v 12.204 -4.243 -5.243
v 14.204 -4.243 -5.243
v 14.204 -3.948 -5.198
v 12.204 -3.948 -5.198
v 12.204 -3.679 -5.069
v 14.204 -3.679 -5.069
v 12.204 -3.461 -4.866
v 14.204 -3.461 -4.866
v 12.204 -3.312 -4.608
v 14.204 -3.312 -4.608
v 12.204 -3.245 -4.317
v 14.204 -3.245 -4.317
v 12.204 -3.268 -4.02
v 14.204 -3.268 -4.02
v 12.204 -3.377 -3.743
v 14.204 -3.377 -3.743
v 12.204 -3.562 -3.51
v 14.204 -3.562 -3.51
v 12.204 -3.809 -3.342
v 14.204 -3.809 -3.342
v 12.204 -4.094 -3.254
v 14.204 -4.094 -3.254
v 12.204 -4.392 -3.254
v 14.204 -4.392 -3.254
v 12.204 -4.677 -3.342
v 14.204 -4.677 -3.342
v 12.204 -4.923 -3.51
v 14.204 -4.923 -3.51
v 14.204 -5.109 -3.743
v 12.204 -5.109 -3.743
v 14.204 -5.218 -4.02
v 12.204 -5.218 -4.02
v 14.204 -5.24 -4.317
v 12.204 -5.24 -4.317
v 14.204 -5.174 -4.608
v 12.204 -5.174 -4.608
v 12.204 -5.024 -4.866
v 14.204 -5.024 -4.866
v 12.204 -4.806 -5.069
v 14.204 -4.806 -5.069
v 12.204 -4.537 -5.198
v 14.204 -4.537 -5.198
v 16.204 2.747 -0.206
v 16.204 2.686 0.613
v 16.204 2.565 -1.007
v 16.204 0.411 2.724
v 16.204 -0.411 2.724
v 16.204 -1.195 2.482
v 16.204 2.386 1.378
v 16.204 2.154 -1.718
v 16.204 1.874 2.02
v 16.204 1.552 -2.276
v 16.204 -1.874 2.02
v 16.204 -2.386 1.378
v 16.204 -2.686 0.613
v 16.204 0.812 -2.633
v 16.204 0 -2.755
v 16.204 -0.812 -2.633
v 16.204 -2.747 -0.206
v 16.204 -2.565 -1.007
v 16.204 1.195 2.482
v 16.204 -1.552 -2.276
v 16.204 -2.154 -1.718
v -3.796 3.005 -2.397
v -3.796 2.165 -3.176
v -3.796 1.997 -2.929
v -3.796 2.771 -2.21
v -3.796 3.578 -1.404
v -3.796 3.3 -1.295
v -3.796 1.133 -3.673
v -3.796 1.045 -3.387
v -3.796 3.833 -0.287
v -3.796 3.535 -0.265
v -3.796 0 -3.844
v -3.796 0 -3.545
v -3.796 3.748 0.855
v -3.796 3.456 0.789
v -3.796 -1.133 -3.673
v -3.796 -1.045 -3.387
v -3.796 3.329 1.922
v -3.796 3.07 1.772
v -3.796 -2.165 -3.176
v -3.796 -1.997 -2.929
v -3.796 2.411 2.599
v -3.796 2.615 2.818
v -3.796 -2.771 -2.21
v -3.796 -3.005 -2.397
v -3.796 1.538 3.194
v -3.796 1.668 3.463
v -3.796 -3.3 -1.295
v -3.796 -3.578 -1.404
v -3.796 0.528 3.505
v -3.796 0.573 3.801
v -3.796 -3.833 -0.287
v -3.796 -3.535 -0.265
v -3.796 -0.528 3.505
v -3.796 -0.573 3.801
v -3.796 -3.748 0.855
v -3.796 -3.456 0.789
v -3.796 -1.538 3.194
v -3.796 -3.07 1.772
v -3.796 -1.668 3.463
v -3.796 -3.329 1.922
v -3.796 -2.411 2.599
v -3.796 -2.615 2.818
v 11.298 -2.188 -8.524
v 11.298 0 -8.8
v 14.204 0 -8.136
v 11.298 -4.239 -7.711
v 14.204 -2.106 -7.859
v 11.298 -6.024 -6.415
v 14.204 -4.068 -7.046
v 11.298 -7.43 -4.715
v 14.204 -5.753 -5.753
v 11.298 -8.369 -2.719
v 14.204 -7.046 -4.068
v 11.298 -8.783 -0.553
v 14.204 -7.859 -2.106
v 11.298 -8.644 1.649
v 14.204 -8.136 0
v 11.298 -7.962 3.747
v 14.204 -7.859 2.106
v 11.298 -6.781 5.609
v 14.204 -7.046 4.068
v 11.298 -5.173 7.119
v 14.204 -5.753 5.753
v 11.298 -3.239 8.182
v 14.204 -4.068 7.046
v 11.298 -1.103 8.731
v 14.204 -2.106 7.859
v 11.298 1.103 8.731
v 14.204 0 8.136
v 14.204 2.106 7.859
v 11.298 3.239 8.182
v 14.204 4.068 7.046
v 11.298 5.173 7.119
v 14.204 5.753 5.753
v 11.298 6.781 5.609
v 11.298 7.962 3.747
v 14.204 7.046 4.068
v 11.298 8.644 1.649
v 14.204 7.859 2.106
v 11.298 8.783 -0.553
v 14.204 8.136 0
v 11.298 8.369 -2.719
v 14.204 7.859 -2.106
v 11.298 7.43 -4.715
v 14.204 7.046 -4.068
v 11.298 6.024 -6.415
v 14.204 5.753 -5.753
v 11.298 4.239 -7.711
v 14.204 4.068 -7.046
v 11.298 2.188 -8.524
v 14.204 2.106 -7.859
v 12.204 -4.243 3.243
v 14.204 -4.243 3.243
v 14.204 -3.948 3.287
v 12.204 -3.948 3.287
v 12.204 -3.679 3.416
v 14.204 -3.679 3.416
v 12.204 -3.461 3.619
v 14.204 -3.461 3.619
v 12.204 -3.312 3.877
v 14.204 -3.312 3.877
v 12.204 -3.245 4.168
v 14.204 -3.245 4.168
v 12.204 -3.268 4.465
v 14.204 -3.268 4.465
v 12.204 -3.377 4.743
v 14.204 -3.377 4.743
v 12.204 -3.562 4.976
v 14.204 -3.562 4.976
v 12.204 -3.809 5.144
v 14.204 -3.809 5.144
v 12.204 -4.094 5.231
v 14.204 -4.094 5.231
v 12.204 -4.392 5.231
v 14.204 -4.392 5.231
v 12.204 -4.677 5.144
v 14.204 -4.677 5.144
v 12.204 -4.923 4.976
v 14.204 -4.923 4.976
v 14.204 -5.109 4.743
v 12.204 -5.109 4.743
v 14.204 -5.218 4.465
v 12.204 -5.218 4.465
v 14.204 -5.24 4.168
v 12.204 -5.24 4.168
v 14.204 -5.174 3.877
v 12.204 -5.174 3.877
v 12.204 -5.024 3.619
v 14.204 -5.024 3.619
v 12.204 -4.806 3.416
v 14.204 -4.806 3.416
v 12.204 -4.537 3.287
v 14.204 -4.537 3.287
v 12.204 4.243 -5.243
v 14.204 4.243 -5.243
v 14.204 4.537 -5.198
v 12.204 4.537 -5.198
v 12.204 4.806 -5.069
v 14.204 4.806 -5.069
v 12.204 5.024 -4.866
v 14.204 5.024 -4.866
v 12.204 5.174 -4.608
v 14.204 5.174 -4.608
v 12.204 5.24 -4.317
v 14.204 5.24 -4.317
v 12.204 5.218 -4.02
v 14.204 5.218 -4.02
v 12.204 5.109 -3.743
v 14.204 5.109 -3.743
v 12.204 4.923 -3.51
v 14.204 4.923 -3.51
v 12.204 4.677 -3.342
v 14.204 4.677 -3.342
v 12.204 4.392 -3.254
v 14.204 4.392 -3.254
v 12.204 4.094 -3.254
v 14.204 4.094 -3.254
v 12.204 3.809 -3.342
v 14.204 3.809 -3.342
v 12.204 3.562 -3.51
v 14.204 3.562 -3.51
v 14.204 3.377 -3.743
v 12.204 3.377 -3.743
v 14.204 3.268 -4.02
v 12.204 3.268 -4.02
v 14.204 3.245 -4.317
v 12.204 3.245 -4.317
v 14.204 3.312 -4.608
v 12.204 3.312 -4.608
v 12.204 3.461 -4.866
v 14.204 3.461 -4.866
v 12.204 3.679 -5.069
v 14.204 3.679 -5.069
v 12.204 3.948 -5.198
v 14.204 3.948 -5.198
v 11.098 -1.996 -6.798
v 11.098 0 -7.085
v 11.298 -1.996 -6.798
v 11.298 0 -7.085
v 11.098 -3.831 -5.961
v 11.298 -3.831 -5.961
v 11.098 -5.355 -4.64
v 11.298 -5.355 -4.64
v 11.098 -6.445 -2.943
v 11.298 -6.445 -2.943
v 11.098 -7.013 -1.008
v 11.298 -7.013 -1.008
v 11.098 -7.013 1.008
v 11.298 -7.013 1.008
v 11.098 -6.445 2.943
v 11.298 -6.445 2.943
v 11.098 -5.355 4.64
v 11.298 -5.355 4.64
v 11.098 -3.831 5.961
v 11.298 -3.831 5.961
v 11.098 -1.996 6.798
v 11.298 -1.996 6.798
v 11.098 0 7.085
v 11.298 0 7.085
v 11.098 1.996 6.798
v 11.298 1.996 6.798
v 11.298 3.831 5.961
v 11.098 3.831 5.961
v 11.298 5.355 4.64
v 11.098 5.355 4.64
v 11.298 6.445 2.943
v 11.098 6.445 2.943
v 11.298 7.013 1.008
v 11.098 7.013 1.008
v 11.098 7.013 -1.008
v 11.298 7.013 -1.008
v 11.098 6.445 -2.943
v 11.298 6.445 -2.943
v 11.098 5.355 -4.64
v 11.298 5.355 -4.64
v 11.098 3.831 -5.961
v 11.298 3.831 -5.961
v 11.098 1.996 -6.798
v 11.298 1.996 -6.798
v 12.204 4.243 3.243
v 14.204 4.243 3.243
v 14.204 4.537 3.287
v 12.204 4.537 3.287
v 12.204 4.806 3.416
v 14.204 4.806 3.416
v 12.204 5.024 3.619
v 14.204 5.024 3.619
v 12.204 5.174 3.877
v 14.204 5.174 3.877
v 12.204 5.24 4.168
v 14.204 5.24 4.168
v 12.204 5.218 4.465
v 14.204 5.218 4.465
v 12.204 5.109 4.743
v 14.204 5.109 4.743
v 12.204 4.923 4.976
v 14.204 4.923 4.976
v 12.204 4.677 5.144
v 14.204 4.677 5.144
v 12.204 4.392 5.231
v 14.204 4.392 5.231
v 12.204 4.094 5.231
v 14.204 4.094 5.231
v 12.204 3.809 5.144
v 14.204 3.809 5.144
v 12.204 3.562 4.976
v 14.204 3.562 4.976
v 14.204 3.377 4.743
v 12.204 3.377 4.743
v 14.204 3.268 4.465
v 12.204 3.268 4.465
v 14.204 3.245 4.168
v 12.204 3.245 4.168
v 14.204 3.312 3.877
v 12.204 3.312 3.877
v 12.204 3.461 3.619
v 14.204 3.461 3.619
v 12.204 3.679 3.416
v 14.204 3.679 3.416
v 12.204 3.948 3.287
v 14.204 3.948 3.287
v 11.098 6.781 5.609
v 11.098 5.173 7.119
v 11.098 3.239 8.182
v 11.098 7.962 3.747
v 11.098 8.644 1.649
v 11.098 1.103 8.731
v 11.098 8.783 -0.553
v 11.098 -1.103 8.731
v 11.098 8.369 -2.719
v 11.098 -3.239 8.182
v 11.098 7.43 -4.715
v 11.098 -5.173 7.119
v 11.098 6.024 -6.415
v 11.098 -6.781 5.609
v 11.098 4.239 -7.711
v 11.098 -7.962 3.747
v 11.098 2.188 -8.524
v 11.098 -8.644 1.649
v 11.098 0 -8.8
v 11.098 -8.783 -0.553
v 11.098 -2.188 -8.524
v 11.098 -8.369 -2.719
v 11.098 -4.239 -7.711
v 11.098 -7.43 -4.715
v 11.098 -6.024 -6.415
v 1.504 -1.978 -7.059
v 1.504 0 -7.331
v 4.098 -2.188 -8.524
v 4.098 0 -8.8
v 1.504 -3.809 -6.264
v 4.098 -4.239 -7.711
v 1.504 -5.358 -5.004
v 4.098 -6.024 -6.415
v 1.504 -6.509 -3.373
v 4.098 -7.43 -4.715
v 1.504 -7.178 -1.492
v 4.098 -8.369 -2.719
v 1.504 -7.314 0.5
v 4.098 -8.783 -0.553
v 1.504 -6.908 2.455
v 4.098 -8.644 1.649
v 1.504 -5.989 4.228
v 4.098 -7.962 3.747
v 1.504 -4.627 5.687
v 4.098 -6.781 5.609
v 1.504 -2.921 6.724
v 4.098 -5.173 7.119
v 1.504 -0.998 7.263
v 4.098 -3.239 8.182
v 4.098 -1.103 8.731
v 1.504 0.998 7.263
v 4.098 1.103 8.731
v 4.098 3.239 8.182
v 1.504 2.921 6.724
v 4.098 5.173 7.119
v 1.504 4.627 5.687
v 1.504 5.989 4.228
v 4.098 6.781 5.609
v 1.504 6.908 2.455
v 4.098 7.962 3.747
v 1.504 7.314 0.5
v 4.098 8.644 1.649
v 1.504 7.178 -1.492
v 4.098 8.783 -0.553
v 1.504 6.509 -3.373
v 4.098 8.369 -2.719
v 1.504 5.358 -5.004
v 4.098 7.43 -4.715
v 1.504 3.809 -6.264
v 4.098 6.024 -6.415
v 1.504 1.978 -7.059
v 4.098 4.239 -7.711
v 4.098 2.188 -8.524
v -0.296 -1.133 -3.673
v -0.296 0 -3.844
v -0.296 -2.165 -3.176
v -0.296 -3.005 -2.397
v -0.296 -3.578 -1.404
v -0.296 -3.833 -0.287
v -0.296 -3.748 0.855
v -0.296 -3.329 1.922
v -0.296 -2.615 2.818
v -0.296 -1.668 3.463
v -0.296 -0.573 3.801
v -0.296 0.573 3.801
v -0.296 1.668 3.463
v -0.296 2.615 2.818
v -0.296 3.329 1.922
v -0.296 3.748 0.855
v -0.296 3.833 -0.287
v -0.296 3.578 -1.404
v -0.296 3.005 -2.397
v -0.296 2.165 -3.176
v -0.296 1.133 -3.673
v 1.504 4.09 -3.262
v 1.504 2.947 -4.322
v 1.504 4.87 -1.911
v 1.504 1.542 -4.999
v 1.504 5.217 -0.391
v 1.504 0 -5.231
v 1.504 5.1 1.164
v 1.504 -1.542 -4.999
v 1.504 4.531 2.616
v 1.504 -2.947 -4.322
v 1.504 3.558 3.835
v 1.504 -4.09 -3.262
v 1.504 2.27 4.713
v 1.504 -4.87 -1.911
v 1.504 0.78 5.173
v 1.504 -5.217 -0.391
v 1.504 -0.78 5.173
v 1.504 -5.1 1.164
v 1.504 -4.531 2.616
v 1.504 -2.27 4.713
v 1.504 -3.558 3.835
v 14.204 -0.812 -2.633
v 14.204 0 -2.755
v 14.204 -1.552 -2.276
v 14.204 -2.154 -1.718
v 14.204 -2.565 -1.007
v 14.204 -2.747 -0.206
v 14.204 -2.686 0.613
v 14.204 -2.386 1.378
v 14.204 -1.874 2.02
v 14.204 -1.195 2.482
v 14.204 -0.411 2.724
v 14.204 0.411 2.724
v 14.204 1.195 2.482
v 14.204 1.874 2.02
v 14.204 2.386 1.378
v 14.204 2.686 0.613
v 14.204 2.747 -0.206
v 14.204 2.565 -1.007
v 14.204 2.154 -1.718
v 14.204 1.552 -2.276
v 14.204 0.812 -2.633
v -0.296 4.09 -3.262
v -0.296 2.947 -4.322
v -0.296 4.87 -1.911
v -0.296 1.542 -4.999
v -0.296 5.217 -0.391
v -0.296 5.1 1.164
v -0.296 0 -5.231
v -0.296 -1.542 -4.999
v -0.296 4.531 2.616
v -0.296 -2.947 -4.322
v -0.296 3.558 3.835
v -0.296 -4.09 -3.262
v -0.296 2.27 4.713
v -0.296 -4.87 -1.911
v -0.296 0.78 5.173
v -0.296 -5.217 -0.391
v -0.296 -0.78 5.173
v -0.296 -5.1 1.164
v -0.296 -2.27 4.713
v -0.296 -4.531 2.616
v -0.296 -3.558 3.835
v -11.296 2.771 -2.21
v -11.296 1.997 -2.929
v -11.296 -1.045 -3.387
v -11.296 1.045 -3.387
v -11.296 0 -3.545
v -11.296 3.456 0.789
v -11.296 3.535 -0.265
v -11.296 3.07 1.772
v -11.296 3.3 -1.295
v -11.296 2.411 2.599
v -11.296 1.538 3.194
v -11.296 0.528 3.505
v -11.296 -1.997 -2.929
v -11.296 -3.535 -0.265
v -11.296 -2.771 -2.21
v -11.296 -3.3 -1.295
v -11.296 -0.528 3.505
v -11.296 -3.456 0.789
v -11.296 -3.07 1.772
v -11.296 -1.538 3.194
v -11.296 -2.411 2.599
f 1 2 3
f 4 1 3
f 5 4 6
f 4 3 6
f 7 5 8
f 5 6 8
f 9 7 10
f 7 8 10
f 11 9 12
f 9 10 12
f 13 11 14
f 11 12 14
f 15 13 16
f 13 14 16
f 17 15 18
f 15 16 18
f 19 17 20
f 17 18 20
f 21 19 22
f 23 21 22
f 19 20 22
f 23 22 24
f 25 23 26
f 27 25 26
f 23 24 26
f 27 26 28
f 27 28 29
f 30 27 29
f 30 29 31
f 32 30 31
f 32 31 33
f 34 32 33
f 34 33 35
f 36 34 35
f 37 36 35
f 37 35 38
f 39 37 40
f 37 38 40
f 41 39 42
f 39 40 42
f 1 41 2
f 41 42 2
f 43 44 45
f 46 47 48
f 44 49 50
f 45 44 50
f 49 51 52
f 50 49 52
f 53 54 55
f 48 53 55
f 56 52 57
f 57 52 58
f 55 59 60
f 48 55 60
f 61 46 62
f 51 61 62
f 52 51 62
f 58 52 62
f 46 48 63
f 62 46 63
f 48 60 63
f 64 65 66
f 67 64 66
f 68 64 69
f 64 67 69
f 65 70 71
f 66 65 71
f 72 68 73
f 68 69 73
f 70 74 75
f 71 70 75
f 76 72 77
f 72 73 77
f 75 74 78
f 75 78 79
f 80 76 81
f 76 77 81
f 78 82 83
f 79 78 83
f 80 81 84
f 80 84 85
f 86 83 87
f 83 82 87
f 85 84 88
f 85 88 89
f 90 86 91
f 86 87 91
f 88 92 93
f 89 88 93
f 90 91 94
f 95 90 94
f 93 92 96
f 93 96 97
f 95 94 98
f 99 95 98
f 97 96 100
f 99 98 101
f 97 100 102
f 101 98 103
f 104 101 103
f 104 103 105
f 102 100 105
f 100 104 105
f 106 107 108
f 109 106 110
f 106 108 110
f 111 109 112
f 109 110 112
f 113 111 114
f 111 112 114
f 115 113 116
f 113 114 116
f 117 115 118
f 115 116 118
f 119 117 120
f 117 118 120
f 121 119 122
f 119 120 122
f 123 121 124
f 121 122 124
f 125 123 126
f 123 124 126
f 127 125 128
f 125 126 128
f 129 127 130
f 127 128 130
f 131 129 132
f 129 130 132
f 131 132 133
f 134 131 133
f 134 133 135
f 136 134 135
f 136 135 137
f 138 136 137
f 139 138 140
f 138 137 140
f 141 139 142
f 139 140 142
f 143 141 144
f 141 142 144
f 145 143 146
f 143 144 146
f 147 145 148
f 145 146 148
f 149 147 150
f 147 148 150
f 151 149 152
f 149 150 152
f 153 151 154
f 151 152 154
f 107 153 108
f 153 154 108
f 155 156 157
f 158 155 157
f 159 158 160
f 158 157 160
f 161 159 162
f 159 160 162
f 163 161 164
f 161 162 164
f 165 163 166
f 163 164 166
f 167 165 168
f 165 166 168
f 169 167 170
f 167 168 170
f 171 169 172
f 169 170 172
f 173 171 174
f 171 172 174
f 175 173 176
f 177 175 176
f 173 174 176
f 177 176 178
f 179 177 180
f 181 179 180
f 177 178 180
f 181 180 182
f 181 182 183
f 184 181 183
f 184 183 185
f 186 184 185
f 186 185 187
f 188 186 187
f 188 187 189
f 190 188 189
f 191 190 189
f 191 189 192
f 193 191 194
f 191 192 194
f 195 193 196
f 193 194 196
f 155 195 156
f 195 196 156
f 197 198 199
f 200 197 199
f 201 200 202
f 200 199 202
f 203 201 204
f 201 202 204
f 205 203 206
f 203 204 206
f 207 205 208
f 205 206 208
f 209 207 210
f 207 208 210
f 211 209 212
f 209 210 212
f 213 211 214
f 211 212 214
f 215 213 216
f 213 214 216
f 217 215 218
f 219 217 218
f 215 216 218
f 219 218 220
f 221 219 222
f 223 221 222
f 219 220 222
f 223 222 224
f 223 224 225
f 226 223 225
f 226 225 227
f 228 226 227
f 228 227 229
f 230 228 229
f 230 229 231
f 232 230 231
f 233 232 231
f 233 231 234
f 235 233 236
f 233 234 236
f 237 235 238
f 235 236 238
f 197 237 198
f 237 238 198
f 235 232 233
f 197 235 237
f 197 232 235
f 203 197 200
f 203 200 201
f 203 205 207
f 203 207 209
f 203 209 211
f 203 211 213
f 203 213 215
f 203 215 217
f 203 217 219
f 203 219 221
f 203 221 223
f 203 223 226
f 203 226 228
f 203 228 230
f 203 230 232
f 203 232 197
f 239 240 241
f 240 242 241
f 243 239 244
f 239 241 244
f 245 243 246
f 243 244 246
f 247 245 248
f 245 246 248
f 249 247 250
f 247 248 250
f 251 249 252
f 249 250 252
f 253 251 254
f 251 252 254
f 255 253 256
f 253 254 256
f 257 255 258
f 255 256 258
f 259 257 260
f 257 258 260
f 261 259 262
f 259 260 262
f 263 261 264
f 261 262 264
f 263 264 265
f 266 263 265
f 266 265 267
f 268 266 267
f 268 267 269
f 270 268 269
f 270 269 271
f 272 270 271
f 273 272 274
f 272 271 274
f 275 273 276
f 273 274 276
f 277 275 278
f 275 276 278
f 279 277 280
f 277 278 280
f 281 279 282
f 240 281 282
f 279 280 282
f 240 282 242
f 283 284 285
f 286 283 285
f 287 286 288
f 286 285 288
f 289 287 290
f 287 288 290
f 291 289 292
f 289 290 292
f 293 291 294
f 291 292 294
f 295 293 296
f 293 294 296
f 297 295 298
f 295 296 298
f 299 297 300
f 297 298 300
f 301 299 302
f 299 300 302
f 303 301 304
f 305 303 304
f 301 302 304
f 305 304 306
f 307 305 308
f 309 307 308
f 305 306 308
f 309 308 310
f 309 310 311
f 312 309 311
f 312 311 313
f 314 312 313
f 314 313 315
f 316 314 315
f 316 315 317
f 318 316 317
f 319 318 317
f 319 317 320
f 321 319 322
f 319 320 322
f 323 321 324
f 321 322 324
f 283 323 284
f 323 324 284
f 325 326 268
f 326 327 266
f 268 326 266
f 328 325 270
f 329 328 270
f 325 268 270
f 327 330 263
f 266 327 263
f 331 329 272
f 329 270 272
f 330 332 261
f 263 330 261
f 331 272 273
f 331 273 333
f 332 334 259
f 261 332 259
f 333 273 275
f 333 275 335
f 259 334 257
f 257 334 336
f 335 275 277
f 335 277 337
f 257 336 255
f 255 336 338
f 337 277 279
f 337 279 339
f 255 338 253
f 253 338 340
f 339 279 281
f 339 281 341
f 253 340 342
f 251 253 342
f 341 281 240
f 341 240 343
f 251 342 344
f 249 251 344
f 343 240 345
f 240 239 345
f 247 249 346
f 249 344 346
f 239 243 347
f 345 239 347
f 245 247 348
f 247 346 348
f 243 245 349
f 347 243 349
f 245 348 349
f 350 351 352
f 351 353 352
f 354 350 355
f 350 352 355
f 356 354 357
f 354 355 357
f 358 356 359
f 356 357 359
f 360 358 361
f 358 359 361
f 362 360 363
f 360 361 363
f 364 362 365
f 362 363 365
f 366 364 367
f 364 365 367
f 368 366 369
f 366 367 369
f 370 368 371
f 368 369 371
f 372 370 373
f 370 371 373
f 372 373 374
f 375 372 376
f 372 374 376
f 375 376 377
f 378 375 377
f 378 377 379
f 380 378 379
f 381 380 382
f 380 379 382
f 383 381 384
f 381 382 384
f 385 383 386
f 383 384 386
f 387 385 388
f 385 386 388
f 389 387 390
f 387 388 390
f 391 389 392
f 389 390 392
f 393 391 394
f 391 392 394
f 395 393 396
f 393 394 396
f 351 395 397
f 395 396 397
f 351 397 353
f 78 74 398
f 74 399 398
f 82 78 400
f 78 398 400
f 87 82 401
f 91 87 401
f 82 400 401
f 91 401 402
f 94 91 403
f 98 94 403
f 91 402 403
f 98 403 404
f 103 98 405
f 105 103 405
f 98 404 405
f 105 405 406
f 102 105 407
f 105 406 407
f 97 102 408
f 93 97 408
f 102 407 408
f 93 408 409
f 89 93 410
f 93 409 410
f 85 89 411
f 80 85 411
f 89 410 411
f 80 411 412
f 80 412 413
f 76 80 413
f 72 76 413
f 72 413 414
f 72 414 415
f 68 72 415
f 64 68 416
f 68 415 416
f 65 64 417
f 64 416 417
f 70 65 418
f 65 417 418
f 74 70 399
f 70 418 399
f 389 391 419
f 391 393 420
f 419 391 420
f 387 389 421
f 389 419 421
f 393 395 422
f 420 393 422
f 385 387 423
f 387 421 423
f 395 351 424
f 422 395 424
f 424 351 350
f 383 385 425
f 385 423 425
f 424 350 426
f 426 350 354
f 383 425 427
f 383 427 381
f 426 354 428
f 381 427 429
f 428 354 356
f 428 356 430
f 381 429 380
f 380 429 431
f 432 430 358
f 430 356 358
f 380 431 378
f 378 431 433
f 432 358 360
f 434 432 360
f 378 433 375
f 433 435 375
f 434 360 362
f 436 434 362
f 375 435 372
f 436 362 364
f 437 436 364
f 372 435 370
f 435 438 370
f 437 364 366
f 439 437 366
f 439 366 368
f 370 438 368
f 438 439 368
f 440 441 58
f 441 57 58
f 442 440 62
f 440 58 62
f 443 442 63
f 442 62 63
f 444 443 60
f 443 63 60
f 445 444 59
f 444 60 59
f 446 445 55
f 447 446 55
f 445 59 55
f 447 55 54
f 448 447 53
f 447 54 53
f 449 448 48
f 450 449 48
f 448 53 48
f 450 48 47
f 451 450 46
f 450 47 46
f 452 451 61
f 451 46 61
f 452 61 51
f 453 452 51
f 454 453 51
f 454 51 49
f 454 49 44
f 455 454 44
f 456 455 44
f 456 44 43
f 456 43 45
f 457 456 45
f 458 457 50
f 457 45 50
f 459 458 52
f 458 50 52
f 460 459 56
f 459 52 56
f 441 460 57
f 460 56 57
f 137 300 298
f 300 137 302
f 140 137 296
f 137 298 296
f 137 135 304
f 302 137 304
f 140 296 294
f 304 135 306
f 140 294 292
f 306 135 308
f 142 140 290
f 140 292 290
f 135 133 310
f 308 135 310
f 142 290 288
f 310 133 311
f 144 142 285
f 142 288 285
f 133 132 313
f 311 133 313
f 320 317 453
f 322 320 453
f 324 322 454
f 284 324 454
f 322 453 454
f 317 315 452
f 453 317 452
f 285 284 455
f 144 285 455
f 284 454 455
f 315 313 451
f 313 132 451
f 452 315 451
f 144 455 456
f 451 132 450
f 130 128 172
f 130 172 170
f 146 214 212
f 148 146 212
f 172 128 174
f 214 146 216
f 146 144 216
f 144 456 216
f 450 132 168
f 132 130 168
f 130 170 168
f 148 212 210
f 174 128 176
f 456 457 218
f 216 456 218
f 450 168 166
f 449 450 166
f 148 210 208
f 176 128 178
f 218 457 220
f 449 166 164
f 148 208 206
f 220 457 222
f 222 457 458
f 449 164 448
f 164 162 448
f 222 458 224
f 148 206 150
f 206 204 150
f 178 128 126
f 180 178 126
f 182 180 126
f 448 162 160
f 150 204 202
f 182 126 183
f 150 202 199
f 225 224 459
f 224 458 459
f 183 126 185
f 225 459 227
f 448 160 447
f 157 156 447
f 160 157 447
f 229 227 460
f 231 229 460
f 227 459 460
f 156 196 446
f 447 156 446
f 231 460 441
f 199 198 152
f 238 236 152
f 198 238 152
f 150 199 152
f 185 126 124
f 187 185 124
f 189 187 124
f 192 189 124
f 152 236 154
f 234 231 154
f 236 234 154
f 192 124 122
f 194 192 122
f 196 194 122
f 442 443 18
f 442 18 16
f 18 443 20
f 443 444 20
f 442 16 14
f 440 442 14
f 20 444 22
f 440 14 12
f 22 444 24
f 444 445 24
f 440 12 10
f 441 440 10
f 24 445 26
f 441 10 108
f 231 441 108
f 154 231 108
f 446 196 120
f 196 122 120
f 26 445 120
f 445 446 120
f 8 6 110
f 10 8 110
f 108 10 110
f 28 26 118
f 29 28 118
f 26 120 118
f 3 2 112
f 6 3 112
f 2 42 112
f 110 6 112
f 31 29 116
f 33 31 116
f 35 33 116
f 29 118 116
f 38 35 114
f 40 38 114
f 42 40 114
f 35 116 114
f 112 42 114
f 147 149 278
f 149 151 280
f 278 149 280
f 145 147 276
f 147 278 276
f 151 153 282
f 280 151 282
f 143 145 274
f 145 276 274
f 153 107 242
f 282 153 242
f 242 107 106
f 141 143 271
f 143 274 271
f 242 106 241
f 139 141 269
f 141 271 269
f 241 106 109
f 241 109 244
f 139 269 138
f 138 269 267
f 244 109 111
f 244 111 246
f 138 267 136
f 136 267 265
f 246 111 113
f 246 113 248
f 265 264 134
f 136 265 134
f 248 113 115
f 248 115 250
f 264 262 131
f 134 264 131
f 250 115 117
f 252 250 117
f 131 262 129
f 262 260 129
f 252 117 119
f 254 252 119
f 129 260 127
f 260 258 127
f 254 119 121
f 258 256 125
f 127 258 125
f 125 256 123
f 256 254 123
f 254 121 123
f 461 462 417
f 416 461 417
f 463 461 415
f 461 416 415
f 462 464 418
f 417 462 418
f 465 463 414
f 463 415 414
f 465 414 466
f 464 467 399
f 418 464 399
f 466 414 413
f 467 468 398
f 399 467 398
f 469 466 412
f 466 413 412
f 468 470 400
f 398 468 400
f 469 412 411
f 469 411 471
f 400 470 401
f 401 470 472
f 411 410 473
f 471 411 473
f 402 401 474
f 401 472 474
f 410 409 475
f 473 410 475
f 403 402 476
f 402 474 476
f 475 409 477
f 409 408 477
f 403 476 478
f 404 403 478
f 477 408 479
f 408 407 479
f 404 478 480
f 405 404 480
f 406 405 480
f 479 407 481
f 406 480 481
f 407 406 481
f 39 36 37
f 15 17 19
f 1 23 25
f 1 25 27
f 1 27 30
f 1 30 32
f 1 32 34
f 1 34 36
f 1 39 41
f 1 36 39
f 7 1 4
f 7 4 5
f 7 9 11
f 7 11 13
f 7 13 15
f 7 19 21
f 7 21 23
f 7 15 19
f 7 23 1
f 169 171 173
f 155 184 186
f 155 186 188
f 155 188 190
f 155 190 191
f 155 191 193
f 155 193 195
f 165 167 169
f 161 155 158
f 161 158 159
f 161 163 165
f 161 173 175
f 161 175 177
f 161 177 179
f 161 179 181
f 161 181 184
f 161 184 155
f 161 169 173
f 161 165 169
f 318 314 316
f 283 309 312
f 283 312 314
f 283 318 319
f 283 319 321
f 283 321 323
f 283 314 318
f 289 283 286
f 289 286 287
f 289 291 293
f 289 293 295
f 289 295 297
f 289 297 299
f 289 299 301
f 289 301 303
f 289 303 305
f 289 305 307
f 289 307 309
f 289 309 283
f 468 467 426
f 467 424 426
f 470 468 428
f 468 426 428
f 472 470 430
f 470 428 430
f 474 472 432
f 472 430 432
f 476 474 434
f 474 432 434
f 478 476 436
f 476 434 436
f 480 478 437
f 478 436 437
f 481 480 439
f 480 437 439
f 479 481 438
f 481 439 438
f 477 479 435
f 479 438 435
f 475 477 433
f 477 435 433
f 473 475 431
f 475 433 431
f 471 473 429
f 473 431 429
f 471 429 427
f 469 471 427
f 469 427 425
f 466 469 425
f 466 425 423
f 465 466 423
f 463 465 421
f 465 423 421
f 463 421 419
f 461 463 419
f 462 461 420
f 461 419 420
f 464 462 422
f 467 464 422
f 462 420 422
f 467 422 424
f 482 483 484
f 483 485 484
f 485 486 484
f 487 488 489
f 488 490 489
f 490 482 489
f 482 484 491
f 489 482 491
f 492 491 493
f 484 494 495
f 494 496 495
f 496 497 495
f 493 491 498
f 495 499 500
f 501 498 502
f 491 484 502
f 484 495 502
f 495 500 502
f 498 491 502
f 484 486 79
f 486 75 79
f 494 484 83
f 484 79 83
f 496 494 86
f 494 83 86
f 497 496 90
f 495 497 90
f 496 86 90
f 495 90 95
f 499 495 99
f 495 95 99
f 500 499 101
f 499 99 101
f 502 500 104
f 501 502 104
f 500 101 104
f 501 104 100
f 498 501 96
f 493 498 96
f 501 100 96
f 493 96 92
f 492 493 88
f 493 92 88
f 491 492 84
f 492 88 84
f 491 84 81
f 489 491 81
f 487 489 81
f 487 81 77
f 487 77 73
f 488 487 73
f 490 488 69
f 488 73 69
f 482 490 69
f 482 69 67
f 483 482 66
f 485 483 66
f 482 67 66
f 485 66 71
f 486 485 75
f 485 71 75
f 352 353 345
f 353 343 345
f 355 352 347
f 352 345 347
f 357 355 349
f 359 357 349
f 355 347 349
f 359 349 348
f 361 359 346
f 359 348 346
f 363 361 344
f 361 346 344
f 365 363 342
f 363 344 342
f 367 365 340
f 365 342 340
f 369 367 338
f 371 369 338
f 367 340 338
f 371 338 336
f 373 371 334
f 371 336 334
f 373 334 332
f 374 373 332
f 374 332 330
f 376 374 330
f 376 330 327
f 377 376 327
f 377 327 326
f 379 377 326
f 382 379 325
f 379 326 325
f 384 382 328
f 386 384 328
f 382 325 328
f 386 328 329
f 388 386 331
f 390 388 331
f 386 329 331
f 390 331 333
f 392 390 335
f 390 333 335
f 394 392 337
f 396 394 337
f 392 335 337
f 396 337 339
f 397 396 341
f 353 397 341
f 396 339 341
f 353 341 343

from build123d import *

# Parameters (mm, degrees)
SKETCH3_R          = 1
CUT_EXTRUDE1_DEPTH = 2


with BuildPart() as part:
    # Sketch2 → Revolve1 (revolve)
    with BuildSketch(Plane(origin=(0, 0, 0), x_dir=(1, 0, 0), z_dir=(0, 1, 0))):
        Polygon((-0.295936569, 3.843953818), (-0.295936569, 5.231399235), (1.504063431, 5.231399235), (1.504063431, 7.33120321), (4.097983636, 8.8), (11.097983636, 8.8), (11.097983636, 7.085375335), (11.297983636, 7.085375335), (11.297983636, 8.8), (14.204063431, 8.136308609), (14.204063431, 2.755066744), (16.204063431, 2.755066744), (16.204063431, 0), (-11.295936569, 0), (-11.295936569, 3.544810333), (-3.795936569, 3.544810333), (-3.795936569, 3.843953818), align=None)
    revolve(axis=Axis((16.204063431, 0, 0), (-1, 0, 0)))

    # Sketch3 → Cut-Extrude1 (cut)
    with BuildSketch(Plane(origin=(14.204063431, 0, 0), x_dir=(0, 0, -1), z_dir=(1, 0, 0))):
        with Locations((4.242640687, 4.242640687)):
            Circle(SKETCH3_R)
        with Locations((4.242640687, -4.242640687)):
            Circle(SKETCH3_R)
        with Locations((-4.242640687, -4.242640687)):
            Circle(SKETCH3_R)
        with Locations((-4.242640687, 4.242640687)):
            Circle(SKETCH3_R)
    extrude(amount=-CUT_EXTRUDE1_DEPTH, mode=Mode.SUBTRACT)


solid = part.part
